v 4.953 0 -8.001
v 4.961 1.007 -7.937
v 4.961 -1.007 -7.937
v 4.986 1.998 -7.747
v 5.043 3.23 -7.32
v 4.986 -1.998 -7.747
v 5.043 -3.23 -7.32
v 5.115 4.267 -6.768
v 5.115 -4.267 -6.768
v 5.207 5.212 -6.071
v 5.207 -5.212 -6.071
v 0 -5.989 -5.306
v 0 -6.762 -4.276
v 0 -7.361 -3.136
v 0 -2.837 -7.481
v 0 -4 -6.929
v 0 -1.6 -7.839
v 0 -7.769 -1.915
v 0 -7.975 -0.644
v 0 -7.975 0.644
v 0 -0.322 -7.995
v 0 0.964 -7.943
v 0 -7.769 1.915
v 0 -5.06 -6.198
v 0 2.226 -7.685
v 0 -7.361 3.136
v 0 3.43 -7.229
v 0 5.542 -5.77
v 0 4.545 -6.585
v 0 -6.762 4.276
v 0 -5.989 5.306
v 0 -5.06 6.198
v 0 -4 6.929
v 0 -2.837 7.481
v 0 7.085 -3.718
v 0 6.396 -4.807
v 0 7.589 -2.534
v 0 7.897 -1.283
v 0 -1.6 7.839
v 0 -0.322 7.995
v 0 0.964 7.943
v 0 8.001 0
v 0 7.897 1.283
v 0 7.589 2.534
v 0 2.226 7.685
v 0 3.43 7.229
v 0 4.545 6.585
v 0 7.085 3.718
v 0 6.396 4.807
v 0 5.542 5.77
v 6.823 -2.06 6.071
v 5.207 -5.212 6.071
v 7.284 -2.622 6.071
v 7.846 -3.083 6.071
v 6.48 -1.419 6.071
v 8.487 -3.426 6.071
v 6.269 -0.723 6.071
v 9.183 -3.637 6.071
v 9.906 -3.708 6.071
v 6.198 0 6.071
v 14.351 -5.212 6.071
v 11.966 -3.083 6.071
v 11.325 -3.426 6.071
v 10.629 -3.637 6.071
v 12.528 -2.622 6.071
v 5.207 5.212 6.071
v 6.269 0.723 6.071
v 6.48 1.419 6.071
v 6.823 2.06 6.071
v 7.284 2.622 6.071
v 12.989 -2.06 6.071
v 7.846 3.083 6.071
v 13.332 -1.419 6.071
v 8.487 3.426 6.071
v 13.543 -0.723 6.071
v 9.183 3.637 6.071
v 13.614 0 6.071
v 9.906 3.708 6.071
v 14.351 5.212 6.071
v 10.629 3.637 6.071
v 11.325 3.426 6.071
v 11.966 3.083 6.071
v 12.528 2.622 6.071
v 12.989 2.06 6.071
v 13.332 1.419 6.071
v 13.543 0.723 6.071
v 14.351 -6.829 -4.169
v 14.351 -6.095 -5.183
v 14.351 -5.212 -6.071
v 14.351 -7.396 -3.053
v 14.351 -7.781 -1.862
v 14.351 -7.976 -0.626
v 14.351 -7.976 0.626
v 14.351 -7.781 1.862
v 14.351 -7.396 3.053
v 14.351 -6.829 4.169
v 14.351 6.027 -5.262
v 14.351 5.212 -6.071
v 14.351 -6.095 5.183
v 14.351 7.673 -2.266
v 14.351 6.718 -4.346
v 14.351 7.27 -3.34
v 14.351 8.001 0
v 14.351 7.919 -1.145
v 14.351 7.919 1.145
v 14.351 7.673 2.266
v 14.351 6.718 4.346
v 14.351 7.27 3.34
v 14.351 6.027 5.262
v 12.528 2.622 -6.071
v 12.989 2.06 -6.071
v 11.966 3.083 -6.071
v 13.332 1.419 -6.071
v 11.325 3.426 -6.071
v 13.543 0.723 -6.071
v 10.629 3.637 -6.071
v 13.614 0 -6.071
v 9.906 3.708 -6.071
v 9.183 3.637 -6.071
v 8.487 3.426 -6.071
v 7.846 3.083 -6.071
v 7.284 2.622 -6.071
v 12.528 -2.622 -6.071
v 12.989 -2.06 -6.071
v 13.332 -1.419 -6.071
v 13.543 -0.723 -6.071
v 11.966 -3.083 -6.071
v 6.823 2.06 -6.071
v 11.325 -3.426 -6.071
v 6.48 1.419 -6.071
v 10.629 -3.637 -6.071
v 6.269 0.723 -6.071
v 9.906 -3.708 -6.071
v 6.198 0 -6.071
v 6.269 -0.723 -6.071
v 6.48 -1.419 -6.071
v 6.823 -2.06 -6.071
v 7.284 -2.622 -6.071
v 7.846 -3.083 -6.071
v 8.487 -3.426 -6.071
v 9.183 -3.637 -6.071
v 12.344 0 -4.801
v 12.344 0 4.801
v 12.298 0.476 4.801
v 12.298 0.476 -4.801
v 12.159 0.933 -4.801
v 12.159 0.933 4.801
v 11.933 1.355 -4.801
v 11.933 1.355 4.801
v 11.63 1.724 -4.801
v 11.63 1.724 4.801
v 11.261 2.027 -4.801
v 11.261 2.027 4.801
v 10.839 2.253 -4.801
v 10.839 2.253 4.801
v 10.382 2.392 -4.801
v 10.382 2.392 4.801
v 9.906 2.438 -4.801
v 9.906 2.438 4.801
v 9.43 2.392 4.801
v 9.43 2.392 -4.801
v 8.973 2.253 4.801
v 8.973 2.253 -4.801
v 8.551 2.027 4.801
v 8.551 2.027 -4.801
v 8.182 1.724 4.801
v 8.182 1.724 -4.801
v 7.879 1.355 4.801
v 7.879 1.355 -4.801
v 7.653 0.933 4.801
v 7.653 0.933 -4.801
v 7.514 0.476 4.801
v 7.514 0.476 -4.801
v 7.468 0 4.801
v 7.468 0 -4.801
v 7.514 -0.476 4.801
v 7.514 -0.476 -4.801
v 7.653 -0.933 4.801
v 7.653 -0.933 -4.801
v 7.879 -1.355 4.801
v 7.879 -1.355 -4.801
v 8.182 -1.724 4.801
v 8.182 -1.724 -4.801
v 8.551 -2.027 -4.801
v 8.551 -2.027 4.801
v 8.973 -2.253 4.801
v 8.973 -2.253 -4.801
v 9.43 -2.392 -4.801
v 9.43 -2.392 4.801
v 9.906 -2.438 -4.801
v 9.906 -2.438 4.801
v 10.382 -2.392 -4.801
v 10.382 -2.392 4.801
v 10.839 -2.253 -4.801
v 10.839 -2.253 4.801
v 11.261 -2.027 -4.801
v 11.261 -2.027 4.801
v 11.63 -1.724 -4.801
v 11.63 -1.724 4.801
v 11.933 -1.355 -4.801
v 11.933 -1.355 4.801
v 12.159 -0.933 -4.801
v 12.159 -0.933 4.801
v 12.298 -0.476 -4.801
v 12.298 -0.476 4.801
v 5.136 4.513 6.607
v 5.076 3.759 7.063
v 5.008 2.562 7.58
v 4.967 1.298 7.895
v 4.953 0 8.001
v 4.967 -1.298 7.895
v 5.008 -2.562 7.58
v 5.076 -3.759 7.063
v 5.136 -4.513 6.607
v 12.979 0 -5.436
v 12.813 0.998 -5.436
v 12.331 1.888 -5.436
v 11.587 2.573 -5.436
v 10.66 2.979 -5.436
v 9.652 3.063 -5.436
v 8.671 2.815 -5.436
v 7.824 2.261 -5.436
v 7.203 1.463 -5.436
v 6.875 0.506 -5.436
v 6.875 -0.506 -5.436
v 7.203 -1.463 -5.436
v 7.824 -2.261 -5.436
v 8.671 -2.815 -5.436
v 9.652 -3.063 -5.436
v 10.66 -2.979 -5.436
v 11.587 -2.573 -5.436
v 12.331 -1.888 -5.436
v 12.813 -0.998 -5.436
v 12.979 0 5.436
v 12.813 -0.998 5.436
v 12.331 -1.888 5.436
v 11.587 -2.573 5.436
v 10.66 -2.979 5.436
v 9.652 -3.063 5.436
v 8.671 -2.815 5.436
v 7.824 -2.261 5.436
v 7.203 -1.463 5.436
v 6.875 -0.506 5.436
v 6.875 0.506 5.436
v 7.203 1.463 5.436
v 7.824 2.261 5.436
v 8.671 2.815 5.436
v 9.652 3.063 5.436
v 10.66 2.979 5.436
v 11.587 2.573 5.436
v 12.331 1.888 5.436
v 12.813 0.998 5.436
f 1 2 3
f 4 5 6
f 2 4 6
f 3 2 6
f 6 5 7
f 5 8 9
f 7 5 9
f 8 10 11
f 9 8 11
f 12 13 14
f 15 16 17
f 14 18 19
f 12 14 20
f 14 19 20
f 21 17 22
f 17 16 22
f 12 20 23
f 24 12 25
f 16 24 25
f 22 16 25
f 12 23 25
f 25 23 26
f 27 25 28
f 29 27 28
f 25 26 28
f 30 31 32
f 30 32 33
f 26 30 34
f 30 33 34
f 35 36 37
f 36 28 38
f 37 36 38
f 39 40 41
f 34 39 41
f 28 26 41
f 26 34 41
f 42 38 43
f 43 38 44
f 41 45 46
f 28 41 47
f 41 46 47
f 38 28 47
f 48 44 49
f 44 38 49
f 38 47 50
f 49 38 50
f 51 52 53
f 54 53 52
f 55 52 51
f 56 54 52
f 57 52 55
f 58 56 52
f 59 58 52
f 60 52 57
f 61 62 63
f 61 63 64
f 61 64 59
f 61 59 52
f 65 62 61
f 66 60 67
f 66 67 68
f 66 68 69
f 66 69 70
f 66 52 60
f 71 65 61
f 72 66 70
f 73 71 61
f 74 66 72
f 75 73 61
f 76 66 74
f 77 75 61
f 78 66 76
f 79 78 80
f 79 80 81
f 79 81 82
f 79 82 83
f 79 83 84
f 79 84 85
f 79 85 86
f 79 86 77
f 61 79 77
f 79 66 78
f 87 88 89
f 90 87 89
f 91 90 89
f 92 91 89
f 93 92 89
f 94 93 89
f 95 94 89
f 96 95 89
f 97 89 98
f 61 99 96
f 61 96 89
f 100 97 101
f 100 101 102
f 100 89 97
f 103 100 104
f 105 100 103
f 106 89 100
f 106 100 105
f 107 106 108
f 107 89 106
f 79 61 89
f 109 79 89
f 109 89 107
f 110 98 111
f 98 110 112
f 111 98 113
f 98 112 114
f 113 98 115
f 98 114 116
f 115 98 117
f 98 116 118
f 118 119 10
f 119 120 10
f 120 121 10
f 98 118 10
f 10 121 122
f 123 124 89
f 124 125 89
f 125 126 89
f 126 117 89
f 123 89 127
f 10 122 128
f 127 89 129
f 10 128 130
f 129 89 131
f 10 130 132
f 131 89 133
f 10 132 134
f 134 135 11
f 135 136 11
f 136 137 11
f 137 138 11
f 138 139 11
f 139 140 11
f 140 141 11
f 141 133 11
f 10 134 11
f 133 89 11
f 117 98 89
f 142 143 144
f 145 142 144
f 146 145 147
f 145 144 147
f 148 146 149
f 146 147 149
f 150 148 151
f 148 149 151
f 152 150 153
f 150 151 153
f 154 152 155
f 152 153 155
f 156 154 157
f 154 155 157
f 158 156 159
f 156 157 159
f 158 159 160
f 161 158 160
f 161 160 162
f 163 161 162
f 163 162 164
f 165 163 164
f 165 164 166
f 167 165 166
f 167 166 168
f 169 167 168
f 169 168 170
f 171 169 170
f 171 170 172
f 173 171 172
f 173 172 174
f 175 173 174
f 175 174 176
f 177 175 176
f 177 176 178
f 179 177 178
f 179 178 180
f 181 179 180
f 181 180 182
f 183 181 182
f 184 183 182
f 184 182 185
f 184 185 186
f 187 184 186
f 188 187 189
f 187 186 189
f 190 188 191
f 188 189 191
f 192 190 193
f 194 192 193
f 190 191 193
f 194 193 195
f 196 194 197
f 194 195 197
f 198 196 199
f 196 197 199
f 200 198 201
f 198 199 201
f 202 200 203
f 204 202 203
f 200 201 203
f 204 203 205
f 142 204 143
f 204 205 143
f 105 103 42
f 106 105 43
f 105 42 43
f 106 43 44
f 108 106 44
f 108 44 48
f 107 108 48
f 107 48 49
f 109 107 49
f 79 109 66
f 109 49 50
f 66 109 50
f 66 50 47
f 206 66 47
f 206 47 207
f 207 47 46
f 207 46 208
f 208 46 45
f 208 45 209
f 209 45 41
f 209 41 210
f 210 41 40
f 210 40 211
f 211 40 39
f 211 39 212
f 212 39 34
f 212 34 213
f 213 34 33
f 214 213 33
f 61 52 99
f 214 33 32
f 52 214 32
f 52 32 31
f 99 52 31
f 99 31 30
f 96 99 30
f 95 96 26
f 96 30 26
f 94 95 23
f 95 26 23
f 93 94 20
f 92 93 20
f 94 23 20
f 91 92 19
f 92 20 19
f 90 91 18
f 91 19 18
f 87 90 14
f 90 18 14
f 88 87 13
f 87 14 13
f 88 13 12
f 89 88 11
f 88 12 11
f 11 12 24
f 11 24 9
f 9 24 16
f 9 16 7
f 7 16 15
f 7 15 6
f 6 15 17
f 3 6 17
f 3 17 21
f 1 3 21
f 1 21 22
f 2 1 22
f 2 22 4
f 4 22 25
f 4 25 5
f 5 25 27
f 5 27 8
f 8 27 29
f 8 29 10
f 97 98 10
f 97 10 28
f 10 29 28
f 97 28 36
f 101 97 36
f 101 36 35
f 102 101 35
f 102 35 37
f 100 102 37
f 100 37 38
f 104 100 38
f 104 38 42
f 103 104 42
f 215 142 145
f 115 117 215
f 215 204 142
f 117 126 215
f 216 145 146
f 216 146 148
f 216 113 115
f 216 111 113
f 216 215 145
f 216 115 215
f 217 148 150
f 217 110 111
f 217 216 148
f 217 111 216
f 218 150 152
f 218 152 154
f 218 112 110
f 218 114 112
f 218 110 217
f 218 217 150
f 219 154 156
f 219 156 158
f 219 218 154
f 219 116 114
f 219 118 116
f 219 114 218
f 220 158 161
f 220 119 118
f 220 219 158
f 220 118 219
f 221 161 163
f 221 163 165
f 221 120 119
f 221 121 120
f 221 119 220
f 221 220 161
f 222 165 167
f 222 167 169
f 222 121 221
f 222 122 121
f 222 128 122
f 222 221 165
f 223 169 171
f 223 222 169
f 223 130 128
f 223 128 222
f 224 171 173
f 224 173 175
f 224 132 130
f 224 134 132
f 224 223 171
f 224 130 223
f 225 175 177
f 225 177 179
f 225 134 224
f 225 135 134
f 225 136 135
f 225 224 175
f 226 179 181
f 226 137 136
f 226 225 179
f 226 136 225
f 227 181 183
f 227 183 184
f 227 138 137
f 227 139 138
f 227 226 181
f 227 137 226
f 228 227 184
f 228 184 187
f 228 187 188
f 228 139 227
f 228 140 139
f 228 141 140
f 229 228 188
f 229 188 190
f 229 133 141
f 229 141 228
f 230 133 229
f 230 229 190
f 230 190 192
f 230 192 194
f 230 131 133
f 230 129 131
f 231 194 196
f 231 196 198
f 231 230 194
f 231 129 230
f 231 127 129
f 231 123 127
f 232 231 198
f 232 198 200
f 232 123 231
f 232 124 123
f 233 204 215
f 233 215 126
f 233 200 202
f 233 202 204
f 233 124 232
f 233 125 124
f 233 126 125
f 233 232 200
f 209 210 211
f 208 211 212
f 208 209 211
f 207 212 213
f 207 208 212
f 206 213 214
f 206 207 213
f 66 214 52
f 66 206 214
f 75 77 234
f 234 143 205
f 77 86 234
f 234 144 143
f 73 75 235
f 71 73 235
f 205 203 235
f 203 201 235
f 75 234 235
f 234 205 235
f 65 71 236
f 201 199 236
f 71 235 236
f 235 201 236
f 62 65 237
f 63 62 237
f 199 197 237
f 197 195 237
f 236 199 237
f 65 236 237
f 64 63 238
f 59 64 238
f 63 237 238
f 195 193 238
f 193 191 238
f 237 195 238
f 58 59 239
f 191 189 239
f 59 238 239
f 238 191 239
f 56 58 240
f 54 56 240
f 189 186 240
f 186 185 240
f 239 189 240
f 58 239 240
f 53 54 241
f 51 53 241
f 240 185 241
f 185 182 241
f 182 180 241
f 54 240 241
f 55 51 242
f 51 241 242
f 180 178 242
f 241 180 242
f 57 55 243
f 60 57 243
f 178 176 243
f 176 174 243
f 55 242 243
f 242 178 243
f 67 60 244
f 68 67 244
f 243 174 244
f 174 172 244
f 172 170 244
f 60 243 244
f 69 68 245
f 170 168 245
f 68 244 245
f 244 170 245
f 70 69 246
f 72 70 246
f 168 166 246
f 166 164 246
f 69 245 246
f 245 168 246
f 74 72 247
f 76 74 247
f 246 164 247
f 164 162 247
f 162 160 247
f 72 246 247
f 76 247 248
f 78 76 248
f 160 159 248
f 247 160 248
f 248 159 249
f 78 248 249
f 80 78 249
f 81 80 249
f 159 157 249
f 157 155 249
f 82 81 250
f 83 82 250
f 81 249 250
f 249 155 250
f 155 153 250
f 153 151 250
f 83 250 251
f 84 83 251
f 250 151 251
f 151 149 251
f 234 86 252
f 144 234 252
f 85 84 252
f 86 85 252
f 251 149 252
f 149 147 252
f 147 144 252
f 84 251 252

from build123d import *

# Parameters (mm, degrees)
F0_R          = 8.001
F1_DEPTH      = 14.351
F3_DEPTH      = 25.4
F3_DEPTH_BACK = 25.4
F4_R          = 2.4384
F5_DEPTH      = 25.4
F5_DEPTH_BACK = 25.4
F6_SIZE       = 1.27


with BuildPart() as f1:
    # F0 (on Right) → F1 (new body)
    with BuildSketch(Plane.YZ):
        Circle(F0_R)
    extrude(amount=F1_DEPTH)

    # F2 (on Front) → F3 (cut, two sides)
    with BuildSketch(Plane.XZ) as f3_sk:
        Polygon((14.351, 8.001), (4.953, 8.001), (5.207, 6.0706), (14.351, 6.0706), align=None)
        Polygon((4.953, -8.001), (14.351, -8.001), (14.351, -6.0706), (5.207, -6.0706), align=None)
    extrude(amount=-F3_DEPTH, mode=Mode.SUBTRACT)
    extrude(f3_sk.sketch, amount=F3_DEPTH_BACK, mode=Mode.SUBTRACT)

    # F4 (on Top) → F5 (cut, two sides)
    with BuildSketch(Plane.XY) as f5_sk:
        with Locations((9.906, 0)):
            Circle(F4_R)
    extrude(amount=-F5_DEPTH, mode=Mode.SUBTRACT)
    extrude(f5_sk.sketch, amount=F5_DEPTH_BACK, mode=Mode.SUBTRACT)

    # F6
    f6_edges = [f1.edges().sort_by_distance(p)[0] for p in [
        (7.4676, 0, 6.0706),
        (7.4676, 0, -6.0706),
    ]]
    chamfer(f6_edges, length=F6_SIZE)


solid = f1.part
